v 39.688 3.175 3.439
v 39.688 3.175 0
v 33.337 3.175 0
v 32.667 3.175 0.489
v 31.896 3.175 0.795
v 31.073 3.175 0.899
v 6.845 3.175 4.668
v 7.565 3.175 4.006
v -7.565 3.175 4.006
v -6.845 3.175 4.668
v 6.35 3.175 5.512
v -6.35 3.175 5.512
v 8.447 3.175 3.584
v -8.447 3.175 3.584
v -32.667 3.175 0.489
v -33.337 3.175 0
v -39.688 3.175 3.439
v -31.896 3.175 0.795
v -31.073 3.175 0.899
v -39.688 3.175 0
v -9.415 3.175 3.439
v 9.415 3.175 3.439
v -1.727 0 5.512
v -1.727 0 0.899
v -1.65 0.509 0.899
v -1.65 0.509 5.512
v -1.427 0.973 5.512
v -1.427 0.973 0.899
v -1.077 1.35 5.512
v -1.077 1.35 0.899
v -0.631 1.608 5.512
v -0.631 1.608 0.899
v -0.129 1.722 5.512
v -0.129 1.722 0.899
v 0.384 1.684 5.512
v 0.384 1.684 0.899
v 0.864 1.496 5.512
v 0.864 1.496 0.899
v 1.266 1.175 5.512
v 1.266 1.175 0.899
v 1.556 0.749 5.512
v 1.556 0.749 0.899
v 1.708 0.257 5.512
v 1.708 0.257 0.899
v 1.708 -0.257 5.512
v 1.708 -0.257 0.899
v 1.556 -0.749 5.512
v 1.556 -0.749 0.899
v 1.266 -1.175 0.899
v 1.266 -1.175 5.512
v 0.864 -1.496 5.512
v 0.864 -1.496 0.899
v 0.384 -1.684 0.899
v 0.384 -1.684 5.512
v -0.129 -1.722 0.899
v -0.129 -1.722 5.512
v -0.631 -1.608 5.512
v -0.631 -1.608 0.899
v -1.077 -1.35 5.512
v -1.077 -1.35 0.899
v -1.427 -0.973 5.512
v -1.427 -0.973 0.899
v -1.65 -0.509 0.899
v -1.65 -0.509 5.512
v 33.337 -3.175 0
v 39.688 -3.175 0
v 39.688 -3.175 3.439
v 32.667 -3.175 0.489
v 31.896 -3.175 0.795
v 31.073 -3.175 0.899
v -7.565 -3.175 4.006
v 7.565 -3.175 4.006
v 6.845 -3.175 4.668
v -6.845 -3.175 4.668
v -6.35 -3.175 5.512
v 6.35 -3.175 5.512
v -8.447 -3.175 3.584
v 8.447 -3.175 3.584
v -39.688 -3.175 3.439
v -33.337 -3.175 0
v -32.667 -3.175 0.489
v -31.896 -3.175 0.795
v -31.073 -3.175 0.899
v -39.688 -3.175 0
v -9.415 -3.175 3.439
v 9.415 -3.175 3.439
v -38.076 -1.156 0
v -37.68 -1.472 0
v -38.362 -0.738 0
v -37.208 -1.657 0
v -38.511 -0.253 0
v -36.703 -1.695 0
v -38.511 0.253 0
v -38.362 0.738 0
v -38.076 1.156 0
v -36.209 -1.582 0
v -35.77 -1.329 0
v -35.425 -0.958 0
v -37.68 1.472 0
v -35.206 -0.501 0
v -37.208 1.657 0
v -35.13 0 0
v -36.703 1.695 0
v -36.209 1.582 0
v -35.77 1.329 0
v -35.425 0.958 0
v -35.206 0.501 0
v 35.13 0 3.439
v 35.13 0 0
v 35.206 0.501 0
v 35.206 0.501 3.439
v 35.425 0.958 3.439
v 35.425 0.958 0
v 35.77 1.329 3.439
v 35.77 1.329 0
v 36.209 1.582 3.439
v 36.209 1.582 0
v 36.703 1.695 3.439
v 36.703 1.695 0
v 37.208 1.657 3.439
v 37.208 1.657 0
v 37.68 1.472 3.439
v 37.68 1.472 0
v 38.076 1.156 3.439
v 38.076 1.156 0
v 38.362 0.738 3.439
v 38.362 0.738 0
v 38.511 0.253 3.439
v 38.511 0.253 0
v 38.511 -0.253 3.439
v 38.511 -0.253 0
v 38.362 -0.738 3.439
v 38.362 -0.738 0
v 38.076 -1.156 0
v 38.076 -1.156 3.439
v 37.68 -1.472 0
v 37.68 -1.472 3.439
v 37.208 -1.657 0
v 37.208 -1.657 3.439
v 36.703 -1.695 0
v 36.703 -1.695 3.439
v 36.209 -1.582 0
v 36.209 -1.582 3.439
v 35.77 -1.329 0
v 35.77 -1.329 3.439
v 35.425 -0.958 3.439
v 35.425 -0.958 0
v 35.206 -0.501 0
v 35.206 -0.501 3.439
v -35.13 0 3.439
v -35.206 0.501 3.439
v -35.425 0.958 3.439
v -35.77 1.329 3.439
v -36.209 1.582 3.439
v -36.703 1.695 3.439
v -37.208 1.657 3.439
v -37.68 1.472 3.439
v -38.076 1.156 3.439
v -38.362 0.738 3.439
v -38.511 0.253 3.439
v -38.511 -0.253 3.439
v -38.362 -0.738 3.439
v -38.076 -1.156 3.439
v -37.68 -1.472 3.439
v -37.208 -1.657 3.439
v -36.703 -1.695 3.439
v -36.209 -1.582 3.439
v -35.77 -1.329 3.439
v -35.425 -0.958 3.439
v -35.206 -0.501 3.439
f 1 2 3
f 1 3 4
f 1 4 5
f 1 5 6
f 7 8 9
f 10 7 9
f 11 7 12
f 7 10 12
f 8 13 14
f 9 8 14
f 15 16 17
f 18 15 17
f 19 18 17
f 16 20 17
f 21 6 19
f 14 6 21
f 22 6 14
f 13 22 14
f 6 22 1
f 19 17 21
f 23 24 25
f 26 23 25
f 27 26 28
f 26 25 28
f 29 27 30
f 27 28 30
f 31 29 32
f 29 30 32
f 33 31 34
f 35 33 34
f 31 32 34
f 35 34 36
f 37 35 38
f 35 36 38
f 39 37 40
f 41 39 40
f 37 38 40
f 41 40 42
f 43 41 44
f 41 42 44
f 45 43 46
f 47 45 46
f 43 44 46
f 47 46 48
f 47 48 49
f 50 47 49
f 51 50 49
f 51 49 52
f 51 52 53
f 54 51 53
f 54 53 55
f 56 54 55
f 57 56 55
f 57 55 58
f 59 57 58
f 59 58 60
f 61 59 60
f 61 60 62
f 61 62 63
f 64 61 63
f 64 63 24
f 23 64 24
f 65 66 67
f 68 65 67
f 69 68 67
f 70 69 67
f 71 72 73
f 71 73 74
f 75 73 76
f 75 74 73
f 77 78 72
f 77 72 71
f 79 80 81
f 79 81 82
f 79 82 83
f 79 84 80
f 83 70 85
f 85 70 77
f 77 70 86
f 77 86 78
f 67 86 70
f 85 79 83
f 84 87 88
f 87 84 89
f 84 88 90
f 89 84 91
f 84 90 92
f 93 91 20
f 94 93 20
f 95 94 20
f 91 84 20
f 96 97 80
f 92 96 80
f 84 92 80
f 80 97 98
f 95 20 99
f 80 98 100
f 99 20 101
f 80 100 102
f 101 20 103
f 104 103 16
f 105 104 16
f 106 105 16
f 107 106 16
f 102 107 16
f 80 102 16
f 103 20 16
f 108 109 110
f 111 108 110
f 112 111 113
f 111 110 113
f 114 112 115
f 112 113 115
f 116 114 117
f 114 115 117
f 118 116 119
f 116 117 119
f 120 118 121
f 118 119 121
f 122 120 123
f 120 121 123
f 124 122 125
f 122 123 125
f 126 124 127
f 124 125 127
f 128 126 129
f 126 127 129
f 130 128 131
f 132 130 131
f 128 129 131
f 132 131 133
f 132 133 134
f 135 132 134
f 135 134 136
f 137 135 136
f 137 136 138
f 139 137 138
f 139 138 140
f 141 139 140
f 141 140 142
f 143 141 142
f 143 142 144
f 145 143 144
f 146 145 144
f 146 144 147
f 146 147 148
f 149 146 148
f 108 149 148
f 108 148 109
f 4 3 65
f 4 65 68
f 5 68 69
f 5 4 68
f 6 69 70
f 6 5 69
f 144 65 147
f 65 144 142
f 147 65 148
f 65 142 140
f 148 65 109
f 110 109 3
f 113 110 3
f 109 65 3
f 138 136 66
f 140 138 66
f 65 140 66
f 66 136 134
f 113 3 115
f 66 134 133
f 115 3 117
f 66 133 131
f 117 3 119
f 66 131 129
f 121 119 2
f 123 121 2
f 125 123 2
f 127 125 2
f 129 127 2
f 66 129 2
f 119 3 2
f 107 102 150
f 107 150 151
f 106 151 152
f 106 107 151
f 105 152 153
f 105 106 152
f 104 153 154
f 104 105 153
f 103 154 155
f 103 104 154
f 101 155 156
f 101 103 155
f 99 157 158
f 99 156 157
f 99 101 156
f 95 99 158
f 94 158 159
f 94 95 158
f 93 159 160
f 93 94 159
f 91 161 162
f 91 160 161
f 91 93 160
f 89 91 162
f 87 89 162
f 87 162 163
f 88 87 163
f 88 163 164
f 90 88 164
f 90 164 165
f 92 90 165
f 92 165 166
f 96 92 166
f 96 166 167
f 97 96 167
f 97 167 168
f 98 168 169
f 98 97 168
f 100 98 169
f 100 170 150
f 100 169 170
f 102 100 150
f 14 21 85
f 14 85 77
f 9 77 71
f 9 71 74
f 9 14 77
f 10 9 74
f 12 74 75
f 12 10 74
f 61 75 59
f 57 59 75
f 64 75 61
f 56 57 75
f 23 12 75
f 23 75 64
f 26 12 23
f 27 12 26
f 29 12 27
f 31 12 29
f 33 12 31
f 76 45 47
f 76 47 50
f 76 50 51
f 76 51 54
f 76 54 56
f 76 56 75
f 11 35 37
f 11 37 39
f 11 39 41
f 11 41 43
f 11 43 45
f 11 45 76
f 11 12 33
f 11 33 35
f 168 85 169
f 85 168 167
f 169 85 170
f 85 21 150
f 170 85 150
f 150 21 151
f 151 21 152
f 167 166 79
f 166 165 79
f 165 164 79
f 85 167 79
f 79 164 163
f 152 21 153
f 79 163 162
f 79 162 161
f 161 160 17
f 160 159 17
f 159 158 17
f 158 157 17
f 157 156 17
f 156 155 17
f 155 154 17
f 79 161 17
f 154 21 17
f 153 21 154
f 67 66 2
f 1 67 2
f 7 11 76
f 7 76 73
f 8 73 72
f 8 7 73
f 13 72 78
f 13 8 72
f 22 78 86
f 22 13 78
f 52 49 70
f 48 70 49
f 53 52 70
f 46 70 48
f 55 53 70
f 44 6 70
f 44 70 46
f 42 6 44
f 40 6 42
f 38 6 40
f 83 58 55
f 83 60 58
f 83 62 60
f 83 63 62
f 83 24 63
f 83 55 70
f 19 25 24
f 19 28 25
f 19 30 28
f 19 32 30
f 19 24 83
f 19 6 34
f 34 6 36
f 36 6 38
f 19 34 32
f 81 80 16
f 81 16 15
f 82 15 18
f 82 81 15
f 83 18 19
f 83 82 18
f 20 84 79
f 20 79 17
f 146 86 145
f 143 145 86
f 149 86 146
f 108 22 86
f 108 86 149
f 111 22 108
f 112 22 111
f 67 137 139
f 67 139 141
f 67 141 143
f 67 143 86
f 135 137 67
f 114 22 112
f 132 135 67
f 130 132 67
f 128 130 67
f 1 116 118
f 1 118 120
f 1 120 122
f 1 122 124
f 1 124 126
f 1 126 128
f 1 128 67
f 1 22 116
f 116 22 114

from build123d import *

# Parameters (mm, degrees)
SKETCH1_W             = 79.375
SKETCH1_H             = 6.35
BOSS_EXTRUDE1_DEPTH   = 5.5118
SKETCH10_W            = 66.675
SKETCH10_H            = 6.35
CUT_EXTRUDE2_DEPTH    = 0.89916
SKETCH2_W             = 33.3375
SKETCH2_H             = 6.35
CUT_EXTRUDE1_DEPTH    = 2.07264
M3_CLEARANCE_HOLE1_D  = 3.4
F_8_32_TAPPED_HOLE1_D = 3.4544
FILLET1_R             = 3.302


with BuildPart() as part:
    # Sketch1 → Boss-Extrude1 (new body)
    with BuildSketch(Plane.XY):
        Rectangle(SKETCH1_W, SKETCH1_H)
    extrude(amount=BOSS_EXTRUDE1_DEPTH)

    # Sketch10 → Cut-Extrude2 (cut)
    with BuildSketch(Plane(origin=(0, 0, 0), x_dir=(-1, 0, 0), z_dir=(0, 0, -1))):
        Rectangle(SKETCH10_W, SKETCH10_H)
    extrude(amount=-CUT_EXTRUDE2_DEPTH, mode=Mode.SUBTRACT)

    # Sketch2 → Cut-Extrude1 (cut)
    with BuildSketch(Plane.XY.offset(5.5118)):
        with Locations((23.01875, 0)):
            Rectangle(SKETCH2_W, SKETCH2_H)
    cut_extrude1 = extrude(amount=-CUT_EXTRUDE1_DEPTH, mode=Mode.SUBTRACT)

    # M3 Clearance Hole1 (through all)
    with Locations(Plane.XY.offset(3.43916)):
        with Locations((36.83, 0)):
            m3_clearance_hole1 = Hole(M3_CLEARANCE_HOLE1_D / 2)

    # Mirror2: Cut-Extrude1, M3 Clearance Hole1 across plane
    add(cut_extrude1.mirror(Plane(origin=(0, 0, 0), x_dir=(0, 0, 1), z_dir=(1, 0, 0))), mode=Mode.SUBTRACT)
    add(m3_clearance_hole1.mirror(Plane(origin=(0, 0, 0), x_dir=(0, 0, 1), z_dir=(1, 0, 0))), mode=Mode.SUBTRACT)

    # #8-32 Tapped Hole1 (through all)
    with Locations(Plane.XY.offset(5.5118)):
        with Locations((0, 0)):
            Hole(F_8_32_TAPPED_HOLE1_D / 2)

    # Fillet1
    # the kernel refuses this fillet: 3.302 mm, written as the material it adds along each edge
    with BuildSketch(Plane(origin=(33.3375, 3.175, 0.89916), x_dir=(-1, 0, 0), z_dir=(0, -1, 0))) as fillet1_piece_1:
        with BuildLine():
            CenterArc((2.264854065, 3.302), FILLET1_R, 226.693279333, 43.306720667)
            Line((0, 0.89916), (-0.045297081, 0.8511032))
            ThreePointArc((-0.045297081, 0.8511032), (-0.06604, 0.44958), (-0.06604, 0))
            Line((-0.06604, 0), (0, -0.06604))
            Line((0, -0.06604), (2.264854065, -0.06604))
            Line((2.264854065, -0.06604), (2.264854065, 0))
        make_face()
    extrude(amount=6.35)
    with BuildSketch(Plane(origin=(6.35, 3.175, 3.43916), x_dir=(1, 0, 0), z_dir=(0, -1, 0))) as fillet1_piece_2:
        with BuildLine():
            CenterArc((3.064617103, 3.302), FILLET1_R, 201.858009222, 68.141990778)
            Line((0, 2.07264), (-0.061292342, 2.0480528))
            ThreePointArc((-0.061292342, 2.0480528), (-0.06604, 1.03632), (-0.06604, 0))
            Line((-0.06604, 0), (0, -0.06604))
            Line((0, -0.06604), (3.064617103, -0.06604))
            Line((3.064617103, -0.06604), (3.064617103, 0))
        make_face()
    extrude(amount=6.35)
    with BuildSketch(Plane(origin=(-6.35, 3.175, 3.43916), x_dir=(0, 0, 1), z_dir=(0, -1, 0))) as fillet1_piece_3:
        with BuildLine():
            CenterArc((3.302, 3.064617103), FILLET1_R, 180, 68.141990778)
            Line((0, 3.064617103), (-0.06604, 3.064617103))
            Line((-0.06604, 3.064617103), (-0.06604, 0))
            Line((-0.06604, 0), (0, -0.06604))
            ThreePointArc((0, -0.06604), (1.03632, -0.06604), (2.0480528, -0.061292342))
            Line((2.0480528, -0.061292342), (2.07264, 0))
        make_face()
    extrude(amount=6.35)
    with BuildSketch(Plane(origin=(-33.3375, -3.175, 0.89916), x_dir=(0, 0, -1), z_dir=(0, 1, 0))) as fillet1_piece_4:
        with BuildLine():
            CenterArc((3.302, -2.264854065), FILLET1_R, 136.693279333, 43.306720667)
            Line((0, -2.264854065), (-0.06604, -2.264854065))
            Line((-0.06604, -2.264854065), (-0.06604, 0))
            Line((-0.06604, 0), (0, 0.06604))
            ThreePointArc((0, 0.06604), (0.44958, 0.06604), (0.8511032, 0.045297081))
            Line((0.8511032, 0.045297081), (0.89916, 0))
        make_face()
    extrude(amount=6.35)


solid = part.part
